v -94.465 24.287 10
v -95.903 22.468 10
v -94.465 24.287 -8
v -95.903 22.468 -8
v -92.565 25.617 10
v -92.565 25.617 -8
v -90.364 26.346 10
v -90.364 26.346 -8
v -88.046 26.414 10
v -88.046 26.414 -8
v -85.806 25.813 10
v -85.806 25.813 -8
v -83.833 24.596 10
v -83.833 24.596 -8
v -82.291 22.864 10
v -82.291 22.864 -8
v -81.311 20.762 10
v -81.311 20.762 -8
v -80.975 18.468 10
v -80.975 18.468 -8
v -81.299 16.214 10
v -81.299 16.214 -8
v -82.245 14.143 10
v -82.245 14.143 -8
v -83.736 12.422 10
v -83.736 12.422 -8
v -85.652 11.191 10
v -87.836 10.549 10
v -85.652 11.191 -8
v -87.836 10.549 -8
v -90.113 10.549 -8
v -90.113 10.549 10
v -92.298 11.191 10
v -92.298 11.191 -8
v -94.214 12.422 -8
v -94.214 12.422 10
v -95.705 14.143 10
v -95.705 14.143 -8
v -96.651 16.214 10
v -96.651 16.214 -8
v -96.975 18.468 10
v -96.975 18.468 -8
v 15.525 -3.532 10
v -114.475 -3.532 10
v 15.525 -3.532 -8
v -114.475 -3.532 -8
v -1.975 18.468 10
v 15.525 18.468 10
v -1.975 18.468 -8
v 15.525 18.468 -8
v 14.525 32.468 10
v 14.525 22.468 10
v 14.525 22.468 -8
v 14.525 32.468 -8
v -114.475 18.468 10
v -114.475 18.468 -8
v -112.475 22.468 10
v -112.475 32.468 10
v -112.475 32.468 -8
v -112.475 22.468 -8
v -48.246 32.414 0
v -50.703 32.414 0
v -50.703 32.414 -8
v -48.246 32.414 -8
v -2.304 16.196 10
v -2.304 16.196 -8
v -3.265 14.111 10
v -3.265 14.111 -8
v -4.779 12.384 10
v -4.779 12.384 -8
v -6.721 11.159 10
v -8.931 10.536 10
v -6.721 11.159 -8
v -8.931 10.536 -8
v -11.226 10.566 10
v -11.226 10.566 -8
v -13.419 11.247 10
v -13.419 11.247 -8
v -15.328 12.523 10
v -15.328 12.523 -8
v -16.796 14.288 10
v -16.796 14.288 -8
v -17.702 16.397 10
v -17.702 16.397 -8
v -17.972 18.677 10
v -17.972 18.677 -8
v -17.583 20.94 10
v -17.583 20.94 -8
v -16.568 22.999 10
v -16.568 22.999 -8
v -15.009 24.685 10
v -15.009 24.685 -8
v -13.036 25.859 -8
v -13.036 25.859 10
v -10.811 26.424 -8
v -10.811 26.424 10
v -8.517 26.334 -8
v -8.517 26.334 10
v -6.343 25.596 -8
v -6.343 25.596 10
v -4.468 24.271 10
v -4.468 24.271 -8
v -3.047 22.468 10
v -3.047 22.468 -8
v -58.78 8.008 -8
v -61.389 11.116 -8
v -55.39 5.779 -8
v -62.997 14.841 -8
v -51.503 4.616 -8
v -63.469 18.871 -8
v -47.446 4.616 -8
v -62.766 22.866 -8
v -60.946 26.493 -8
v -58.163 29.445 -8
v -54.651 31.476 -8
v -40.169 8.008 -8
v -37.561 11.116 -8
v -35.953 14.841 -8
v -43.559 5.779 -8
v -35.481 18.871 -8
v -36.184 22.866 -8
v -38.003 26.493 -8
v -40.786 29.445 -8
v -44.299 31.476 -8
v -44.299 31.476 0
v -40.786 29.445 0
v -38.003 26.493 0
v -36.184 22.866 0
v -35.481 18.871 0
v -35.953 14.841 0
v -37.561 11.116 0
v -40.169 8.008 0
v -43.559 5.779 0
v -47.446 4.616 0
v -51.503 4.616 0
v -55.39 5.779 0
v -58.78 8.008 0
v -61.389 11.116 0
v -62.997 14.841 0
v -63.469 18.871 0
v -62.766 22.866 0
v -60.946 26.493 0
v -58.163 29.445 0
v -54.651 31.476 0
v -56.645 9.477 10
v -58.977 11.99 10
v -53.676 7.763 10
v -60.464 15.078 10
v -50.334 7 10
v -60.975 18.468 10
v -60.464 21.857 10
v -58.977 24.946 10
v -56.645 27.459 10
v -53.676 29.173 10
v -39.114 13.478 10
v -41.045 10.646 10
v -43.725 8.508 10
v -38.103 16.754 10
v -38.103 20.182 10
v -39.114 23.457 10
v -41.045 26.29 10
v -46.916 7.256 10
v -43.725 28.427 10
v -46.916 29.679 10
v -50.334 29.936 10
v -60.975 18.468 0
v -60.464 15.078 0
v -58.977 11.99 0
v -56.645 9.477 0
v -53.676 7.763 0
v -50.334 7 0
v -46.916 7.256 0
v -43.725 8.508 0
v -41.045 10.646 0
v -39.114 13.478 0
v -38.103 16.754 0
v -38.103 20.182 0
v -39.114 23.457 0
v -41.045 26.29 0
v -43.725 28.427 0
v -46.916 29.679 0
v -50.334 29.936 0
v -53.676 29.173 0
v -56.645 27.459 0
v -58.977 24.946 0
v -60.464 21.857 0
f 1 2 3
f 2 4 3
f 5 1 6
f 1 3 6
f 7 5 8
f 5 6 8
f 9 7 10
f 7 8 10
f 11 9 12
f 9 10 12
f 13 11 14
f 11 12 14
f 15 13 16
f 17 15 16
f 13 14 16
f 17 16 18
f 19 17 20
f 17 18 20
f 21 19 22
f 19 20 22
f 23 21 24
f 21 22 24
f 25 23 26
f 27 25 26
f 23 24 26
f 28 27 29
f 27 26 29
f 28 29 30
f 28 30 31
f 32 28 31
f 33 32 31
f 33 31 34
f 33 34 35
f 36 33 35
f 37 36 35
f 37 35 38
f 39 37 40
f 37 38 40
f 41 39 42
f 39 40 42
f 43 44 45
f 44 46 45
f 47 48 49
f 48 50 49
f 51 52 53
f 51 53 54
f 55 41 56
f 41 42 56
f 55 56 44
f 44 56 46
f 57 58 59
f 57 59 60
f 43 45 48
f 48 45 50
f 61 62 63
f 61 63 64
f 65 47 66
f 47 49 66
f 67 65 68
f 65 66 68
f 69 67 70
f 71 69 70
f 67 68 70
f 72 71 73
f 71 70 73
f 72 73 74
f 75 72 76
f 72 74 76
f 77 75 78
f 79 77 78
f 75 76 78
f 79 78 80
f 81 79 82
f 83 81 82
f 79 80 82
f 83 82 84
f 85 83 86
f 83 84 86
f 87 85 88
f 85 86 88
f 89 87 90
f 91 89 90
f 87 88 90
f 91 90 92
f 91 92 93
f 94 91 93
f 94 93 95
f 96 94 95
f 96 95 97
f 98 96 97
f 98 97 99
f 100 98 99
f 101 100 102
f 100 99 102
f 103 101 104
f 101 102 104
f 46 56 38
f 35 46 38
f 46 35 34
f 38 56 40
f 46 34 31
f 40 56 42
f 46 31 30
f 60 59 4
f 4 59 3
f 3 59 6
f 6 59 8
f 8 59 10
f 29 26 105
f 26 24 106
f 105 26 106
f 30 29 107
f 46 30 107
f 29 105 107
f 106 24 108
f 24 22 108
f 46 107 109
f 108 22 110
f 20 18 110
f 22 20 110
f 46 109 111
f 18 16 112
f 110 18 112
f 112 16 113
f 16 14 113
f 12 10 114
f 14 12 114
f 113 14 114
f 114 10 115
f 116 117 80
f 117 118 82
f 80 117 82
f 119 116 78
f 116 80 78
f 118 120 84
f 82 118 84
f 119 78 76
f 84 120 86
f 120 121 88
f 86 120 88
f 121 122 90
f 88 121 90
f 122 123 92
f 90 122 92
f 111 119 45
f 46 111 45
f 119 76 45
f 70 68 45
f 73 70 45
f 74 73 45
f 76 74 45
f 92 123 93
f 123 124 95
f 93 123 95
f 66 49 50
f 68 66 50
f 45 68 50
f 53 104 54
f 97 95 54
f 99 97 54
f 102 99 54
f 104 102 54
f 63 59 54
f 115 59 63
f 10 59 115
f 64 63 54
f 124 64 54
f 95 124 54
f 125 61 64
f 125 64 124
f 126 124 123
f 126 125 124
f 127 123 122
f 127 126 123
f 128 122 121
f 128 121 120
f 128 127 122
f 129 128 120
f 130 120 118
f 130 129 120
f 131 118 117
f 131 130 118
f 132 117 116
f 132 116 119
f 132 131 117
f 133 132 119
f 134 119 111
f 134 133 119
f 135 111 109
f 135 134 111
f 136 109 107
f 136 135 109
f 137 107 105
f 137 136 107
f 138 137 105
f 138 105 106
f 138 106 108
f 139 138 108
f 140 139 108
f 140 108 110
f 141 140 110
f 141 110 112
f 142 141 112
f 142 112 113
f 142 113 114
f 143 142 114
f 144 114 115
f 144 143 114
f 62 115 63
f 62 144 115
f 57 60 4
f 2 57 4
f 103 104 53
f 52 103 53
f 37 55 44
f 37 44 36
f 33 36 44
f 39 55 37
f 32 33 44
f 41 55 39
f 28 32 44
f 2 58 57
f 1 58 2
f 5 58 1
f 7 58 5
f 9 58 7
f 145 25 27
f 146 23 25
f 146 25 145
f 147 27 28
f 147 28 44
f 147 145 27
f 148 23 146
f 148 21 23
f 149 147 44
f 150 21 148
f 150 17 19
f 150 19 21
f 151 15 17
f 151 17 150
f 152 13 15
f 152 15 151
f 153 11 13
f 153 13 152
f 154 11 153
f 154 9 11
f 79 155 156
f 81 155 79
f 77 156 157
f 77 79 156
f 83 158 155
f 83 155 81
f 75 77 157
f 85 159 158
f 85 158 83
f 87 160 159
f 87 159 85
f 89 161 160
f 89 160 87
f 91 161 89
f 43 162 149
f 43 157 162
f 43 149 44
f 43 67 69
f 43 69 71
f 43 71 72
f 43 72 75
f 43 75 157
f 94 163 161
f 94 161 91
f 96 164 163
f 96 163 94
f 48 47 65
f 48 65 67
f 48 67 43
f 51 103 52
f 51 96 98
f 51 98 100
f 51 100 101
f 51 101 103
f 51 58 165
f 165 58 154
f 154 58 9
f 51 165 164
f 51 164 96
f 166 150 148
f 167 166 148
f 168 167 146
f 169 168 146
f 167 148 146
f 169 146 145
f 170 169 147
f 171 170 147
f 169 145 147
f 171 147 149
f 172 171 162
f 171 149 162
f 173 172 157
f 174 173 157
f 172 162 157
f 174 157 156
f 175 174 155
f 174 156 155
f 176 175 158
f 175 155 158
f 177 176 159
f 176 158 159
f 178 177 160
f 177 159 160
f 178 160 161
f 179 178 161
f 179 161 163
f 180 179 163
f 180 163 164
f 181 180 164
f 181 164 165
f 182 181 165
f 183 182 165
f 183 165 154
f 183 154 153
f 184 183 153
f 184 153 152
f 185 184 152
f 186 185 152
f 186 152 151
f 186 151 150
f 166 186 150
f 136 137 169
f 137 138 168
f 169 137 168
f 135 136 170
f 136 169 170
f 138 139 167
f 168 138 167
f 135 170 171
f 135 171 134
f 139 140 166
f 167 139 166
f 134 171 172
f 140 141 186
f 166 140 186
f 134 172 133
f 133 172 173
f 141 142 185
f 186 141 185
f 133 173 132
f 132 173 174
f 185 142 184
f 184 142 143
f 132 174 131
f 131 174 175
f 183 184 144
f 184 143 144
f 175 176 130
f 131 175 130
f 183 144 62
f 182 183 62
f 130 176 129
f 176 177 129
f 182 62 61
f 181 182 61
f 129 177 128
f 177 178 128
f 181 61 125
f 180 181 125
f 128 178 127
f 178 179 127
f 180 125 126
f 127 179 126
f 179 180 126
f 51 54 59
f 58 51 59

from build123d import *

# Parameters (mm, degrees)
F1_DEPTH = 8
F2_DEPTH = 10
F3_DEPTH = 10
F4_D     = 23
F5_DEPTH = 1
F6_DEPTH = 2


with BuildPart() as f1:
    # F0 (on Top) → F1 (new body)
    with BuildSketch(Plane.XY):
        with BuildLine():
            Line((-49.4748241749, 32.4677416086), (-114.4748240411, 32.4677416086))
            Line((-114.4748240411, 32.4677416086), (-114.4748240411, 22.4677416086))
            Line((-114.4748240411, 22.4677416086), (-95.9030272714, 22.4677416086))
            ThreePointArc((-95.9030272714, 22.4677416086), (-86.9042716803, 26.1951482189), (-80.9748240411, 18.4677416086))
            ThreePointArc((-80.9748240411, 18.4677416086), (-88.9748240411, 10.4677416086), (-96.9748240411, 18.4677416086))
            Line((-96.9748240411, 18.4677416086), (-114.4748240411, 18.4677416086))
            Line((-114.4748240411, 18.4677416086), (-114.4748240411, -3.5322583914))
            Line((-114.4748240411, -3.5322583914), (15.5251759589, -3.5322583914))
            Line((15.5251759589, -3.5322583914), (15.5251759589, 18.4677416086))
            Line((15.5251759589, 18.4677416086), (-1.9748240411, 18.4677416086))
            ThreePointArc((-1.9748240411, 18.4677416086), (-17.7022306514, 16.3971892478), (-3.0466208109, 22.4677416086))
            Line((-3.0466208109, 22.4677416086), (15.5251759589, 22.4677416086))
            Line((15.5251759589, 22.4677416086), (15.5251759589, 32.4677416086))
            Line((15.5251759589, 32.4677416086), (-49.4748241749, 32.4677416086))
        make_face()
        with BuildLine():
            ThreePointArc((-50.7033488202, 32.4137348277), (-50.0896797547, 32.4542333936), (-49.4748241749, 32.4677416086))
            ThreePointArc((-49.4748241749, 32.4677416086), (-48.8599684612, 32.4542333995), (-48.246299262, 32.4137348277))
            ThreePointArc((-48.246299262, 32.4137348277), (-39.1501122556, 27.9229161996), (-35.4748240411, 18.4677416086))
            ThreePointArc((-35.4748240411, 18.4677416086), (-58.9299986321, 8.1430298231), (-50.7033488202, 32.4137348277))
        make_face(mode=Mode.SUBTRACT)
        with BuildLine():
            ThreePointArc((-48.246299262, 32.4137348277), (-48.8599684612, 32.4542333995), (-49.4748241749, 32.4677416086))
            ThreePointArc((-49.4748241749, 32.4677416086), (-50.0896797547, 32.4542333936), (-50.7033488202, 32.4137348277))
            Line((-50.7033488202, 32.4137348277), (-48.246299262, 32.4137348277))
        make_face()
    extrude(amount=-F1_DEPTH)

    # F3 (add): a face of the model
    f3_faces = [f1.faces().sort_by_distance(p)[0] for p in [
        (6.7751759589, 17.1188161103, 0),
    ]]


with BuildPart() as f2:
    # F0 (on Top) → F2 (new body)
    with BuildSketch(Plane.XY):
        with BuildLine():
            ThreePointArc((-35.4748240411, 18.4677416086), (-39.1501122556, 27.9229161996), (-48.246299262, 32.4137348277))
            Line((-48.246299262, 32.4137348277), (-50.7033488202, 32.4137348277))
            ThreePointArc((-50.7033488202, 32.4137348277), (-58.9299986321, 8.1430298231), (-35.4748240411, 18.4677416086))
        make_face()
    extrude(amount=F2_DEPTH)


with BuildPart() as f1_1:
    add(f1.part)

    add(f2.part)  # F3 merges F2
    extrude(f3_faces, amount=F3_DEPTH)

    # F4 (through all)
    with Locations(Plane(origin=(0, 0, 0), x_dir=(1, 0, 0), z_dir=(0, 0, -1))):
        with Locations((-49.4748240411, -18.4677416086)):
            Hole(F4_D / 2)

    # F5 (cut, symmetric): faces of the model
    f5_faces = [f1_1.faces().sort_by_distance(p)[0] for p in [
        (15.5251759589, 27.4677416086, 1),
        (15.5251759589, 27.4677416086, 1),
    ]]
    extrude(f5_faces, amount=F5_DEPTH, both=True, mode=Mode.SUBTRACT)

    # F6 (cut): faces of the model
    f6_faces = [f1_1.faces().sort_by_distance(p)[0] for p in [
        (-114.4748240411, 27.4677416086, 1),
        (-114.4748240411, 27.4677416086, 1),
    ]]
    extrude(f6_faces, amount=-F6_DEPTH, mode=Mode.SUBTRACT)


solid = f1_1.part
